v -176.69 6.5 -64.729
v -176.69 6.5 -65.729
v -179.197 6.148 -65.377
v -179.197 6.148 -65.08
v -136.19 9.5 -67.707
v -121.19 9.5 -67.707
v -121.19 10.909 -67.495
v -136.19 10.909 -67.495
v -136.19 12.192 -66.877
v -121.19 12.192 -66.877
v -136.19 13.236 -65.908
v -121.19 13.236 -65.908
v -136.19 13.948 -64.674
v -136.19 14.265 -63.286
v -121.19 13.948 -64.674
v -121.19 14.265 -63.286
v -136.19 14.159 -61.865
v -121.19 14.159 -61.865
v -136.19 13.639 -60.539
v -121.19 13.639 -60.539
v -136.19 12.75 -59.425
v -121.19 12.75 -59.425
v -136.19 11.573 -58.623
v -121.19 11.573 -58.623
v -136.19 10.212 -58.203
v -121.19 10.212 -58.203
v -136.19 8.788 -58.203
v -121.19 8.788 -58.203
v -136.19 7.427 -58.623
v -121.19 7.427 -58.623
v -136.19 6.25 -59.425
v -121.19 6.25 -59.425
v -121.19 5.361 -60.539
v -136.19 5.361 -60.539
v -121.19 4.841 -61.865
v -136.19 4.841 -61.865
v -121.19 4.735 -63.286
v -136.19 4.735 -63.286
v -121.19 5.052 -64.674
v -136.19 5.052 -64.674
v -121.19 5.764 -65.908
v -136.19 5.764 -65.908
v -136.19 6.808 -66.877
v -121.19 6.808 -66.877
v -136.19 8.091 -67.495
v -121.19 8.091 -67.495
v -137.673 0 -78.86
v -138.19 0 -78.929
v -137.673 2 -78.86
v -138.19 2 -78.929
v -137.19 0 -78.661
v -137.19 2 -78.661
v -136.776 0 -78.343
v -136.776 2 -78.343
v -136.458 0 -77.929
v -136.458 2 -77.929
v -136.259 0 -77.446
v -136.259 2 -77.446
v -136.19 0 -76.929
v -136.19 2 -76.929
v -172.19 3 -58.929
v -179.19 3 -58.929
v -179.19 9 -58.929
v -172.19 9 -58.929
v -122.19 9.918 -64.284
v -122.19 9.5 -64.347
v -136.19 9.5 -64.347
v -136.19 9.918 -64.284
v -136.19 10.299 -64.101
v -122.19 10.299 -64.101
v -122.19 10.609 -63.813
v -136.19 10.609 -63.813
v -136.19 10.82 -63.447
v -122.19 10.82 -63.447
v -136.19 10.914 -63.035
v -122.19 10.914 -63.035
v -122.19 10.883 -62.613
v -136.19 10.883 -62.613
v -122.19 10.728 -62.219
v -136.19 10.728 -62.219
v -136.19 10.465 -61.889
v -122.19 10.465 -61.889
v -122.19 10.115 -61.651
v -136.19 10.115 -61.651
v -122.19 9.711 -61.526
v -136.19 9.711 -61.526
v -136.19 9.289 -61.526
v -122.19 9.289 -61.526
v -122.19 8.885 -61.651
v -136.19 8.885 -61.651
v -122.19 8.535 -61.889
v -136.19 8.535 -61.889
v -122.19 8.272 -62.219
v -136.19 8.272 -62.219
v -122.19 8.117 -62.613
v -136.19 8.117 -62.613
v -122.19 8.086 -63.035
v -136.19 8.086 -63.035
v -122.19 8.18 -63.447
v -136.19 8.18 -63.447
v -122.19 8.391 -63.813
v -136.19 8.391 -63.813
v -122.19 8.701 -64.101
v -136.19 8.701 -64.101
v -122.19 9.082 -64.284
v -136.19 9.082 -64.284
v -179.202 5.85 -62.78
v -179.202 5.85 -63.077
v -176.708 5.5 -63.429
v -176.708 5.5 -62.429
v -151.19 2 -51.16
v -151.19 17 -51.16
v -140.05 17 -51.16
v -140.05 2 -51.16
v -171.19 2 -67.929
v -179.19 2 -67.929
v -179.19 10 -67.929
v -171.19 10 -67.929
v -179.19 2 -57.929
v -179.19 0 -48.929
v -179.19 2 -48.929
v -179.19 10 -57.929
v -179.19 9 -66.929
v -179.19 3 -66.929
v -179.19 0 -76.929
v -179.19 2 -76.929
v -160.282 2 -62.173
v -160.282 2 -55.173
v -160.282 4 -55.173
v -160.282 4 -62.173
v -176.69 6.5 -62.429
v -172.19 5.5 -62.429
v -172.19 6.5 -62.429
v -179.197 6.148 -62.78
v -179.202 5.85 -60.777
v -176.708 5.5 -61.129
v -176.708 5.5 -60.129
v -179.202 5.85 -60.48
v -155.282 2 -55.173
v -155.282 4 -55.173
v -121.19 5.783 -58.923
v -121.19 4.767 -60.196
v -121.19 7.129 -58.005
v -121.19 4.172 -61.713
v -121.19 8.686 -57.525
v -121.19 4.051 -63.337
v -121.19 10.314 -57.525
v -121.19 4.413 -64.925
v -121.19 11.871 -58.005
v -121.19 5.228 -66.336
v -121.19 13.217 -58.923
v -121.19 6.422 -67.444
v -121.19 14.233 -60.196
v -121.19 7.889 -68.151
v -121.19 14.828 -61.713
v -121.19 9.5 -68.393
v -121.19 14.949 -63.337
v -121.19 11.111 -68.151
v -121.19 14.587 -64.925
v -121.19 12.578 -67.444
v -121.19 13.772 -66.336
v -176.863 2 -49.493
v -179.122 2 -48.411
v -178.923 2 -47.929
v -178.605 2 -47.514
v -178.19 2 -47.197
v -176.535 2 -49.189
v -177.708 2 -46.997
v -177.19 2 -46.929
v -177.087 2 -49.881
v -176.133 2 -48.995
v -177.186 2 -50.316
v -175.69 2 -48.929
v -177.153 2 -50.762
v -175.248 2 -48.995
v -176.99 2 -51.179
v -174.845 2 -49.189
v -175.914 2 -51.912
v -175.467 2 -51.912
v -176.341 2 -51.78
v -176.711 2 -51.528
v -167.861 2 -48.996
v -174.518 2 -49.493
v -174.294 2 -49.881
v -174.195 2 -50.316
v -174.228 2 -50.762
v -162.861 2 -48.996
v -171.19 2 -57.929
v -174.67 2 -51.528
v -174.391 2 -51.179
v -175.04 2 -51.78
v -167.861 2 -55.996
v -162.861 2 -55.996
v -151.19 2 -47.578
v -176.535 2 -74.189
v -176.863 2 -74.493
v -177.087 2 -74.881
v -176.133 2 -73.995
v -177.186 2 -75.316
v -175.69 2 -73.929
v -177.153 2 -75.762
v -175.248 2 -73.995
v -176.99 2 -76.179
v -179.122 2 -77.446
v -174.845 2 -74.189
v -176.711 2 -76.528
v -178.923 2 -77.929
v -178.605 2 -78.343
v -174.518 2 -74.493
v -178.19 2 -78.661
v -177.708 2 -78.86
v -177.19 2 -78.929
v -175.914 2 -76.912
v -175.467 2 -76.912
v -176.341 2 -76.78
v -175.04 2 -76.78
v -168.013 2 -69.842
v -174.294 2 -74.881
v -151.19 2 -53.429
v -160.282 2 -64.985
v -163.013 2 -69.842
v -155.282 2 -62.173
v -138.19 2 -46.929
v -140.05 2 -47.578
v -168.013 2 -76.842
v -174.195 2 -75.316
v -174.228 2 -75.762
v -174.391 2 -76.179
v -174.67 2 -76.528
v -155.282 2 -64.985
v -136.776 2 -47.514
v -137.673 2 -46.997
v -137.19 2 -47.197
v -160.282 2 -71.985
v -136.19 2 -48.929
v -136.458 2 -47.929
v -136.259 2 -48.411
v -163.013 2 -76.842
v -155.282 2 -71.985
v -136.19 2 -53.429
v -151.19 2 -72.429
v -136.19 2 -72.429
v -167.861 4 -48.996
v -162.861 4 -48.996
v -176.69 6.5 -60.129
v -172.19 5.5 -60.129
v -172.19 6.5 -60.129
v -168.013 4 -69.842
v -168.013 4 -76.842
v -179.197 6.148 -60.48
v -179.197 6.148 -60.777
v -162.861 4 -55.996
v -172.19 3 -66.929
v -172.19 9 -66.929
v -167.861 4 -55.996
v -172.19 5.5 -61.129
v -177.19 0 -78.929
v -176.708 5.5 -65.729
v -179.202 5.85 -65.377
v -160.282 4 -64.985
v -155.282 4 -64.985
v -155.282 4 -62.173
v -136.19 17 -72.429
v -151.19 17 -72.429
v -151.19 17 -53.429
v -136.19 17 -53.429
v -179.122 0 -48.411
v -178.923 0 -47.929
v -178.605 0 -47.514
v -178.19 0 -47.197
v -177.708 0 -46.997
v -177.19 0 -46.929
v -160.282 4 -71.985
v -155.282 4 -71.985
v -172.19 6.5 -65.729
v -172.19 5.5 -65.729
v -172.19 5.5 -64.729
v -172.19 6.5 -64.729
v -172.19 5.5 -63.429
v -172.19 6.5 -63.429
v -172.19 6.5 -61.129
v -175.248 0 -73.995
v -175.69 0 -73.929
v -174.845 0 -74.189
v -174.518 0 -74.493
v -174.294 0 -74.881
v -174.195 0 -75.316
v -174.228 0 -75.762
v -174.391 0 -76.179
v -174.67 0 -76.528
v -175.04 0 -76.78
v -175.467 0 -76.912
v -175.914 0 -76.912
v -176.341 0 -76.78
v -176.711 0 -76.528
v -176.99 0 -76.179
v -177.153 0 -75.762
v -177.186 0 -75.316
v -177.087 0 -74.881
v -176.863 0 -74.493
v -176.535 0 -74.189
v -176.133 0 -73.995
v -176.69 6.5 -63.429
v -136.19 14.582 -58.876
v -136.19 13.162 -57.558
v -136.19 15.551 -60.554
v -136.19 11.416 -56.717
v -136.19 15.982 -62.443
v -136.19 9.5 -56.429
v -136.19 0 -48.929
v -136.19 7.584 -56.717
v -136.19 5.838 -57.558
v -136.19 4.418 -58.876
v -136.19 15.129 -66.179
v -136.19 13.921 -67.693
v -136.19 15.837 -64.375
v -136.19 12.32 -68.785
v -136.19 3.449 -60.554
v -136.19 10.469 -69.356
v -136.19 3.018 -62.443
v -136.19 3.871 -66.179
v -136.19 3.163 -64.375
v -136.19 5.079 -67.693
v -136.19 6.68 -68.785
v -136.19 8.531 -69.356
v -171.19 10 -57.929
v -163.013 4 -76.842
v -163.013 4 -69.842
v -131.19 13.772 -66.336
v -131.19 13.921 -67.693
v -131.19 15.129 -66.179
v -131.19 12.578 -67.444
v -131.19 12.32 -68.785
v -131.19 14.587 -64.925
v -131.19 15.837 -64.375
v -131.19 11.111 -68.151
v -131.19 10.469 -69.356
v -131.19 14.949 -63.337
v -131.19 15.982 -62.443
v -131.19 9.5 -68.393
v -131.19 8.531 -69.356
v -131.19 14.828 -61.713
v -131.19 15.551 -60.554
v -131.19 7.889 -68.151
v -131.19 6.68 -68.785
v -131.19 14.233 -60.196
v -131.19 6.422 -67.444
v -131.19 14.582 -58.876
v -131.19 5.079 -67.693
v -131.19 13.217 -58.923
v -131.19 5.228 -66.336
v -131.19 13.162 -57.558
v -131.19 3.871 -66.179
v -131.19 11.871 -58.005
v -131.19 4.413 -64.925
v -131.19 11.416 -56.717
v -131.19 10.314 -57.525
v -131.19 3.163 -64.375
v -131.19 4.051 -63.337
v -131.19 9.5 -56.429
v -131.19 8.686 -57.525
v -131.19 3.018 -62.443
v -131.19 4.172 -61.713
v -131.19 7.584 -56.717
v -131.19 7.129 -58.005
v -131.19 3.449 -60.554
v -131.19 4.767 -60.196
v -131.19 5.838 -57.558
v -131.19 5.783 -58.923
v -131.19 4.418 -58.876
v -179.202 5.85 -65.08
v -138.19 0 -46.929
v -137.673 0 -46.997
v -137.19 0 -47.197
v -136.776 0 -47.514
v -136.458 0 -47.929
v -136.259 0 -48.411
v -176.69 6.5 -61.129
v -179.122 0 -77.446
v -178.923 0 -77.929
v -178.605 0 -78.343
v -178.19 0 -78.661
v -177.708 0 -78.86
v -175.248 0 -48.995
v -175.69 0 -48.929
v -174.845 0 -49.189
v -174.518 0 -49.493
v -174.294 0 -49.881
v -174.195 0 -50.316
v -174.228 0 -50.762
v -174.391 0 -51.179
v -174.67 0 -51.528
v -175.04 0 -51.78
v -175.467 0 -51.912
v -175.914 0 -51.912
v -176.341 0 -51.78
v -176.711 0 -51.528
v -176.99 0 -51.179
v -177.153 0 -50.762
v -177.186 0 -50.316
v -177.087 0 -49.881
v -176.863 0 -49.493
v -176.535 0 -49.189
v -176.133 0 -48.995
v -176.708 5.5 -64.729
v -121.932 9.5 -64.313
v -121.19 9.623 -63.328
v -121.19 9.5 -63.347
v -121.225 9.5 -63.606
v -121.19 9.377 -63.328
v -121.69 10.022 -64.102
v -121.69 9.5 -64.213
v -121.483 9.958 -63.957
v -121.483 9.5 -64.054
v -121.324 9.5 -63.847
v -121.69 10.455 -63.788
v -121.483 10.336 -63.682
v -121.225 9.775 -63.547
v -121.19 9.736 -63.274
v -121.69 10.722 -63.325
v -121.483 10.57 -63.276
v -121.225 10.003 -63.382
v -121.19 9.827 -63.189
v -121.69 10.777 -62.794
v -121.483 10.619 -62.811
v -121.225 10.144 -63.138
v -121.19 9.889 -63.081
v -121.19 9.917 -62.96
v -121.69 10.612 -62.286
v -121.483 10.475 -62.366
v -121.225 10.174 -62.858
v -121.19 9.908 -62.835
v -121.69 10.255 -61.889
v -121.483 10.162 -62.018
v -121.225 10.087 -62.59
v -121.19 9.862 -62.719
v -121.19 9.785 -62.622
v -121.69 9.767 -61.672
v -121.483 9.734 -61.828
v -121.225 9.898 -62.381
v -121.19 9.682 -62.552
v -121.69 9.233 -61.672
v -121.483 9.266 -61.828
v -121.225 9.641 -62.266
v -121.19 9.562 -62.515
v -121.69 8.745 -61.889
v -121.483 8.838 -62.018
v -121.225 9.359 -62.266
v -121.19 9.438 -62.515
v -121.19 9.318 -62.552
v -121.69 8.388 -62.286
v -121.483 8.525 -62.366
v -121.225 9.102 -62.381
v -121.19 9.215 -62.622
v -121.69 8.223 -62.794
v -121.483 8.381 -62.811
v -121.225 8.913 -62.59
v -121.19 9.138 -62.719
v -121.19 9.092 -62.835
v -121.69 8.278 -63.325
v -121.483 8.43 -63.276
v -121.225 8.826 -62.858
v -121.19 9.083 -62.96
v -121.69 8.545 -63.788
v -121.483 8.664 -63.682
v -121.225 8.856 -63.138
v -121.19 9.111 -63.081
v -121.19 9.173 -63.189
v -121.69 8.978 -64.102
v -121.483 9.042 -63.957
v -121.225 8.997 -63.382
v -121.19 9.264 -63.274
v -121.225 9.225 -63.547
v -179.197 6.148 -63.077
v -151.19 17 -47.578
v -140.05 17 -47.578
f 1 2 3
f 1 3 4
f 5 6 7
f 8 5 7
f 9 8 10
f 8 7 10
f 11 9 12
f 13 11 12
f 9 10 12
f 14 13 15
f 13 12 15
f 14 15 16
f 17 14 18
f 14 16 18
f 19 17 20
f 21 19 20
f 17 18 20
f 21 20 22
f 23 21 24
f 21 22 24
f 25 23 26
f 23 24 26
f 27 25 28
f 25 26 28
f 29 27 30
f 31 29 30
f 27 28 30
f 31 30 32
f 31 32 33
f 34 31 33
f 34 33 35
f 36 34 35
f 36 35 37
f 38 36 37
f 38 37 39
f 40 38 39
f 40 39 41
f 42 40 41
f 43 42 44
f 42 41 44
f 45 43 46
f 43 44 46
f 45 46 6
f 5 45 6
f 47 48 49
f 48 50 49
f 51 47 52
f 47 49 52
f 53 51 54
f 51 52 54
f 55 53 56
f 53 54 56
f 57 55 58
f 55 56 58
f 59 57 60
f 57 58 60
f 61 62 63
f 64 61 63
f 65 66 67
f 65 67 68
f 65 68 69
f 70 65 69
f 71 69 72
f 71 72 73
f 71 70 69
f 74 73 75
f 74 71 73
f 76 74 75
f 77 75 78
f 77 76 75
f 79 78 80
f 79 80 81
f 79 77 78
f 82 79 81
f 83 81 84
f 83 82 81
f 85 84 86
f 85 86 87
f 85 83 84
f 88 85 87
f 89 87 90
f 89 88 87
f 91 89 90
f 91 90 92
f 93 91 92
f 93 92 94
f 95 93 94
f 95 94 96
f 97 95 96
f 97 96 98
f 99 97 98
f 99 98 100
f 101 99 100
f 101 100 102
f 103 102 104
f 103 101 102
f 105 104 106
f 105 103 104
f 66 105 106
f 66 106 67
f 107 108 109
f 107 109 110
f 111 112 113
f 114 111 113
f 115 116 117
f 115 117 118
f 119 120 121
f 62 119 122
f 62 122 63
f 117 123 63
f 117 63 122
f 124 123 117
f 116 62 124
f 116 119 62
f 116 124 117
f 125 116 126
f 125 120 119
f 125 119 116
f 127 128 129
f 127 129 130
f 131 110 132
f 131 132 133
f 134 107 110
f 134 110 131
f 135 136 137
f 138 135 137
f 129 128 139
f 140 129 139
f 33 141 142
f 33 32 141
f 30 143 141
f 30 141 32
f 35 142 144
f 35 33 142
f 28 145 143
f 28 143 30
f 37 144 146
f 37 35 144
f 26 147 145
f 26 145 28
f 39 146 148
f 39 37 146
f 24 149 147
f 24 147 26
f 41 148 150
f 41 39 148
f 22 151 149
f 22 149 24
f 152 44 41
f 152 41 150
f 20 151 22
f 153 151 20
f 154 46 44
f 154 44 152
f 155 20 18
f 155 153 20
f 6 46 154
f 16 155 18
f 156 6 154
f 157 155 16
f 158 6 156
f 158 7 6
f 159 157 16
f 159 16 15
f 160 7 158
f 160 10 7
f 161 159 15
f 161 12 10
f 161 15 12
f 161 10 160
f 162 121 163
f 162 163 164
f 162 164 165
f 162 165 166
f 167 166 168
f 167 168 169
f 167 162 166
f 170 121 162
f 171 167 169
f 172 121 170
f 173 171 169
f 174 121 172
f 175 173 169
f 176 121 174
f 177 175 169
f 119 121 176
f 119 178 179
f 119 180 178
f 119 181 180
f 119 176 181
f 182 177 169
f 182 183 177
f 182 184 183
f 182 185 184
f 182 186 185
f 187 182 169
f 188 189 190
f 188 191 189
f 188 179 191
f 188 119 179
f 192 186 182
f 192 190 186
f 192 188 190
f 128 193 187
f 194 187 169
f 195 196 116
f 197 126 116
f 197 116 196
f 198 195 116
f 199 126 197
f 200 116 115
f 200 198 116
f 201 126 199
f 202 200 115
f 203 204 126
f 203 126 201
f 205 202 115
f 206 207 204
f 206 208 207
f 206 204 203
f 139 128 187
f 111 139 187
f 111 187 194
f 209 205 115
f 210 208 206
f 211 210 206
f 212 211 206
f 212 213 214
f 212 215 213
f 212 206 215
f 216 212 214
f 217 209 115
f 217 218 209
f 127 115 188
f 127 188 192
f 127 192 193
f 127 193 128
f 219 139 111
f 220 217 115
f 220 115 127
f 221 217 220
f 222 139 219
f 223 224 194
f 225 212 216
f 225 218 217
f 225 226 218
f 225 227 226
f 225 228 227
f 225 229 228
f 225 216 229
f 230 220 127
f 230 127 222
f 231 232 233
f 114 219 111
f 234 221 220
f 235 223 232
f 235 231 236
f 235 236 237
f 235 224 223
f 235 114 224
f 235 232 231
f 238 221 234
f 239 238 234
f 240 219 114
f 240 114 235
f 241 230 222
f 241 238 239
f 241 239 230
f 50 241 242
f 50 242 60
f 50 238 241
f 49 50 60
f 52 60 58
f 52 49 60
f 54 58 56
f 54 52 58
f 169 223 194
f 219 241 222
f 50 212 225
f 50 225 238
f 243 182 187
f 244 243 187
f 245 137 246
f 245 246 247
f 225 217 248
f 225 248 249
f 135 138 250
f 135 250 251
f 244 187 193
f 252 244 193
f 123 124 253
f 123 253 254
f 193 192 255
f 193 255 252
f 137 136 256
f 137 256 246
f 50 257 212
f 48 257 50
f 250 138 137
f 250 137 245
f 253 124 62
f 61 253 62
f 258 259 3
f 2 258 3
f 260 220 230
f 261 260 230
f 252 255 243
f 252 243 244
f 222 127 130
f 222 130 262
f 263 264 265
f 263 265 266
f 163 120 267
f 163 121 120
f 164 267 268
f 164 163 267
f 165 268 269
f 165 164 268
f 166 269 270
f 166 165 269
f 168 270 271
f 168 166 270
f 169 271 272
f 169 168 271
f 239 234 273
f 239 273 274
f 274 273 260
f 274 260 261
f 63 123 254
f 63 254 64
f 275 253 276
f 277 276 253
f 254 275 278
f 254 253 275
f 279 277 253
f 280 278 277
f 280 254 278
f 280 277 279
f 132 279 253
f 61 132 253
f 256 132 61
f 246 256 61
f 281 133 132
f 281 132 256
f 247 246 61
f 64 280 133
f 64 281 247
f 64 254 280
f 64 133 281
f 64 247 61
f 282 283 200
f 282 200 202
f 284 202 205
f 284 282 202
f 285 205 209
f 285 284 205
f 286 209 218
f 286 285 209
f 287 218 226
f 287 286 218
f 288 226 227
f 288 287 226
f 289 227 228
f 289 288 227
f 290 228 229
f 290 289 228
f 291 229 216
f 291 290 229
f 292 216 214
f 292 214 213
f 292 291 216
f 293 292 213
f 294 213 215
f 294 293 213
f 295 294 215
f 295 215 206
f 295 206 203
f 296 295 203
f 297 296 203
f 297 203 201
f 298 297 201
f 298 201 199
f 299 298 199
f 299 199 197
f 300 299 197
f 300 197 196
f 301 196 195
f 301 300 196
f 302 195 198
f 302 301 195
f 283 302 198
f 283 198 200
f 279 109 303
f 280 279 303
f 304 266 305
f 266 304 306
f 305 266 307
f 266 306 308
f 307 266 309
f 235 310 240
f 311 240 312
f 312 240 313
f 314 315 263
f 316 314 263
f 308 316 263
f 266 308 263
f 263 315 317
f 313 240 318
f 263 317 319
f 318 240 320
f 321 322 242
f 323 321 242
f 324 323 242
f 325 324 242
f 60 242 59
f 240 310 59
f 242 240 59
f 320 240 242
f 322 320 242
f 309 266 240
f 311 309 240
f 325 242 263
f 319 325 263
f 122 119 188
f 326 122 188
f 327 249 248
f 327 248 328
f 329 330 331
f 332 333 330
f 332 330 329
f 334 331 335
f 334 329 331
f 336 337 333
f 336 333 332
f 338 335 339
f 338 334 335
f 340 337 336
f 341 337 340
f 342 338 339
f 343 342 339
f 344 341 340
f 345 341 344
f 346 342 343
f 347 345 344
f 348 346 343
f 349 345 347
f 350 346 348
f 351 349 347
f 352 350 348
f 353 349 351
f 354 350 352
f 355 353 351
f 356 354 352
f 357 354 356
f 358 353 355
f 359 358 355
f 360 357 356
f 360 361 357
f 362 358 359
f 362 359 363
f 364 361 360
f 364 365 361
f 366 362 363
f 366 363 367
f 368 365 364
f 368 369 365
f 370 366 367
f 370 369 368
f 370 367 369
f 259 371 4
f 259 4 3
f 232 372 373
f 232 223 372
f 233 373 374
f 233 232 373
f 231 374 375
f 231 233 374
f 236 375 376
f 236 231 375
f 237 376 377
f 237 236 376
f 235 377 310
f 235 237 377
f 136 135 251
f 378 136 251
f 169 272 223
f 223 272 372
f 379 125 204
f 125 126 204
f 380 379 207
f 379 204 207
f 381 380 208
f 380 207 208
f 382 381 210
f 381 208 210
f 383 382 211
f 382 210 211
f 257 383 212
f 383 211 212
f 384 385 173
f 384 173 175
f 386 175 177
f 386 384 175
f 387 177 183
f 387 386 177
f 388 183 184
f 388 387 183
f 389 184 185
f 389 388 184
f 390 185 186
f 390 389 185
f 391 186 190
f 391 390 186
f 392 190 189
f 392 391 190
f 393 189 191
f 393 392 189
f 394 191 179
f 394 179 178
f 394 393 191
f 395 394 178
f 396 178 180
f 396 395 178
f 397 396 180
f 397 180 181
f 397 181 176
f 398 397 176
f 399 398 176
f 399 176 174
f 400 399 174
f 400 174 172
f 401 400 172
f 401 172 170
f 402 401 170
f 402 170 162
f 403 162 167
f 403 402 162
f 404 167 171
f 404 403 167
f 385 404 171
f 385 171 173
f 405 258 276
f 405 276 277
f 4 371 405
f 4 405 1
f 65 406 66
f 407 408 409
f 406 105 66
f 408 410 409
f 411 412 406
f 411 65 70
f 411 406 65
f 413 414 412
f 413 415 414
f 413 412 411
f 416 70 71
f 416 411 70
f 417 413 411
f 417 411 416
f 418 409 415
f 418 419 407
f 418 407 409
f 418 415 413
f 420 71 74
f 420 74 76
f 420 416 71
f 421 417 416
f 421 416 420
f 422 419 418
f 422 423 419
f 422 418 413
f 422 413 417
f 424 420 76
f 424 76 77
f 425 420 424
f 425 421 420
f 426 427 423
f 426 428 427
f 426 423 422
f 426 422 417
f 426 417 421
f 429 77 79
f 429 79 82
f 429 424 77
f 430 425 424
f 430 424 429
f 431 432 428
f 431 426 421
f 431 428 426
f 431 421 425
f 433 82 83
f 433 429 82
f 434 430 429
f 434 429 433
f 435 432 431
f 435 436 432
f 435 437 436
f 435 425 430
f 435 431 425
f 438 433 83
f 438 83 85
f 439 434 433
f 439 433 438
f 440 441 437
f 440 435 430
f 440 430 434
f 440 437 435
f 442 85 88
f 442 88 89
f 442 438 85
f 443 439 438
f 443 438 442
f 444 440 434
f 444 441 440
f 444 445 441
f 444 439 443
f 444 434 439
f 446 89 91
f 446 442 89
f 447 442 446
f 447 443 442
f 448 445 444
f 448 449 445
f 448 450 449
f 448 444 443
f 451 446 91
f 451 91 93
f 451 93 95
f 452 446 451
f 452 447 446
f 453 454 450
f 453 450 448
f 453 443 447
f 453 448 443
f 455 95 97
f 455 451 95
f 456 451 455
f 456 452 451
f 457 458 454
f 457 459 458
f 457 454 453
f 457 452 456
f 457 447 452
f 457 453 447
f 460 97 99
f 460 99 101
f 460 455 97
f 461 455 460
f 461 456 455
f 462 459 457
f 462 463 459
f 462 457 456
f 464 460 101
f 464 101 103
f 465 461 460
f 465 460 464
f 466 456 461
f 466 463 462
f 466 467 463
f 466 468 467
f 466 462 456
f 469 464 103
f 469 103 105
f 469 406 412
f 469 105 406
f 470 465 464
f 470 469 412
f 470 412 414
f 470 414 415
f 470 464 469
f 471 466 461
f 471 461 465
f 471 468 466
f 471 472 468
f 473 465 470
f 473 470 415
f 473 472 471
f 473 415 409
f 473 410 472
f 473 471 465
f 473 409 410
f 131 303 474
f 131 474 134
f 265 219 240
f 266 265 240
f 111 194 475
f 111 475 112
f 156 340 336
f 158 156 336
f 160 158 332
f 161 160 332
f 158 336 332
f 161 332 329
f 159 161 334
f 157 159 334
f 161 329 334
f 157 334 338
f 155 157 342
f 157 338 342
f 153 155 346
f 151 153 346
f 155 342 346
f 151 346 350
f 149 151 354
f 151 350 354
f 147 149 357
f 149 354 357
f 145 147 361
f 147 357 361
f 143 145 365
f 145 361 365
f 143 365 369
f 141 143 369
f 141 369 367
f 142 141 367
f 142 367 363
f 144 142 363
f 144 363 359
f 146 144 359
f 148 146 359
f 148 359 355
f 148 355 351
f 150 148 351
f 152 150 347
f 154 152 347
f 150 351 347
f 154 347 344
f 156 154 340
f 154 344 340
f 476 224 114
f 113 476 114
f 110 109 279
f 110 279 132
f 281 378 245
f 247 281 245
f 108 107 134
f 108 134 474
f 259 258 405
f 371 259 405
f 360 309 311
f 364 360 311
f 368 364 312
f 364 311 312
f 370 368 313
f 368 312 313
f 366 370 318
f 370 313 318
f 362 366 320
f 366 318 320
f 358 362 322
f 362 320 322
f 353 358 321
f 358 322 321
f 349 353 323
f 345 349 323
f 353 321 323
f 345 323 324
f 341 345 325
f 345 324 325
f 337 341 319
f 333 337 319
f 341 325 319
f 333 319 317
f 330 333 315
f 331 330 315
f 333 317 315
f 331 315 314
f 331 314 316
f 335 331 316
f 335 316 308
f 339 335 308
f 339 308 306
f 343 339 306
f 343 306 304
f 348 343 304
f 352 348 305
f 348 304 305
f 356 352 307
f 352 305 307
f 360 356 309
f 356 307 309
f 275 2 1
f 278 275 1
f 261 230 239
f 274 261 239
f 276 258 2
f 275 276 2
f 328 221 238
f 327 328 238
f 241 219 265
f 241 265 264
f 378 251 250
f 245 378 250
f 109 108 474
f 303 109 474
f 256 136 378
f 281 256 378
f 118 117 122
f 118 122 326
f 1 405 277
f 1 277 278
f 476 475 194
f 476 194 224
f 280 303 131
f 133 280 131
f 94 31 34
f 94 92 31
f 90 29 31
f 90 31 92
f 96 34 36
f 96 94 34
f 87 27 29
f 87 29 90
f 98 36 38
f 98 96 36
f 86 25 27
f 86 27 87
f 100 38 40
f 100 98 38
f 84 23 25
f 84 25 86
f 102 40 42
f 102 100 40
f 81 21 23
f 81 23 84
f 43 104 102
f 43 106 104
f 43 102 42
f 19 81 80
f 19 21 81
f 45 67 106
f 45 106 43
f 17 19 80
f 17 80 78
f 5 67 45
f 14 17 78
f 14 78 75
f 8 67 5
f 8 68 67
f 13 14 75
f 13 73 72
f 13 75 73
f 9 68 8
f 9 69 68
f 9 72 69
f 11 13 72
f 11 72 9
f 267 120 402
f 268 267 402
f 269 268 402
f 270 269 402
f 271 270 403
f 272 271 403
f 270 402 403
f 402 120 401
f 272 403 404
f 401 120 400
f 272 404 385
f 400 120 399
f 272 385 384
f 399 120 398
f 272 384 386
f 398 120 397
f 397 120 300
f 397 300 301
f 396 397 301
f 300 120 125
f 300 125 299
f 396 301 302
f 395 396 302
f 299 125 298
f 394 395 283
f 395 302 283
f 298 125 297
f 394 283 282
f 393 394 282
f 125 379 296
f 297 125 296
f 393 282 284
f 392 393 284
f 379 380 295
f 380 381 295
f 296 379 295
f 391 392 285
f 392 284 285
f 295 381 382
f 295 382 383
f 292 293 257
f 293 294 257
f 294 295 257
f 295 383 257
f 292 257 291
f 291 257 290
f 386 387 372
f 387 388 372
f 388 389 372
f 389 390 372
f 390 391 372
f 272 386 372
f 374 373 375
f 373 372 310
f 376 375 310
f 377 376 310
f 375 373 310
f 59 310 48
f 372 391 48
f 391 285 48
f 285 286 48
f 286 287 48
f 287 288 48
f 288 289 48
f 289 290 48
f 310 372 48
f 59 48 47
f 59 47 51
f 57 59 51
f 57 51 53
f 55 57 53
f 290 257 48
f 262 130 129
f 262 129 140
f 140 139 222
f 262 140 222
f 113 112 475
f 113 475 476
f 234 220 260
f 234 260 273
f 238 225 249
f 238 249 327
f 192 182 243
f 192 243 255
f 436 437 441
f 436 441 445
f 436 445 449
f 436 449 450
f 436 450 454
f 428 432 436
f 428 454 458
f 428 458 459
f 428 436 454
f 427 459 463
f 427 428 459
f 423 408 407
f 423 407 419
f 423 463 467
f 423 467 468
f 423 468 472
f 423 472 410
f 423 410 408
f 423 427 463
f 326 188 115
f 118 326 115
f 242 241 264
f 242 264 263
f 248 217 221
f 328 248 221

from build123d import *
from OCP.BRepFilletAPI import BRepFilletAPI_MakeChamfer

# Parameters (mm, degrees)
SKETCH1_W           = 43
SKETCH1_H           = 32
SKETCH1_R           = 1.5
BOSS_EXTRUDE1_DEPTH = 2
FILLET1_R           = 2
SKETCH2_W           = 15
SKETCH2_H           = 19
SKETCH2_W_2         = 11.140552481
SKETCH2_H_2         = 3.582781673
BOSS_EXTRUDE2_DEPTH = 15
SKETCH3_W           = 8
SKETCH3_H           = 10
BOSS_EXTRUDE3_DEPTH = 8
SKETCH4_W           = 5
SKETCH4_H           = 7
BOSS_EXTRUDE4_DEPTH = 2
SKETCH5_W           = 8
SKETCH5_H           = 6
SKETCH5_W_2         = 1
SKETCH5_H_2         = 1
CUT_EXTRUDE1_DEPTH  = 7
DRAFT1_ANGLE        = 1
CHAMFER1_SIZE       = 2.5
CHAMFER1_SIZE2      = 0.351352087
CHAMFER1_SIZE2_2    = 0.352269778
CHAMFER1_SIZE2_3    = 0.350545667
SKETCH6_R           = 6.5
BOSS_EXTRUDE5_DEPTH = 5
SKETCH7_R           = 5.464716876
BOSS_EXTRUDE6_DEPTH = 10
SKETCH8_R           = 4.778839206
SKETCH8_R_2         = 1.418417939
CUT_EXTRUDE2_DEPTH  = 15
FILLET3_R           = 1


with BuildPart() as part:
    # Sketch1 → Boss-Extrude1 (new body)
    with BuildSketch(Plane(origin=(0, 0, 0), x_dir=(1, 0, 0), z_dir=(0, 1, 0))):
        with Locations((-157.69047619, 62.928571429)):
            Rectangle(SKETCH1_W, SKETCH1_H)
        with Locations(Location((-175.69047619, 75.428571429, 0), (0, 0, 270))):
            Circle(SKETCH1_R, mode=Mode.SUBTRACT)
        with Locations(Location((-175.69047619, 50.428571429, 0), (0, 0, 270))):
            Circle(SKETCH1_R, mode=Mode.SUBTRACT)
    extrude(amount=BOSS_EXTRUDE1_DEPTH)

    # Fillet1
    fillet1_edges = [part.edges().sort_by_distance(p)[0] for p in [
        (-179.19047619, 1, -78.928571429),
        (-136.19047619, 1, -78.928571429),
        (-136.19047619, 1, -46.928571429),
        (-179.19047619, 1, -46.928571429),
    ]]
    fillet(fillet1_edges, radius=FILLET1_R)

    # Sketch2 → Boss-Extrude2 (add)
    with BuildSketch(Plane(origin=(0, 2, 0), x_dir=(1, 0, 0), z_dir=(0, 1, 0))):
        with Locations((-143.69047619, 62.928571429)):
            Rectangle(SKETCH2_W, SKETCH2_H)
        with Locations((-145.62019995, 49.369059298)):
            Rectangle(SKETCH2_W_2, SKETCH2_H_2)
    extrude(amount=BOSS_EXTRUDE2_DEPTH)

    # Sketch3 → Boss-Extrude3 (add)
    with BuildSketch(Plane(origin=(0, 2, 0), x_dir=(1, 0, 0), z_dir=(0, 1, 0))):
        with Locations((-175.19047619, 62.928571429)):
            Rectangle(SKETCH3_W, SKETCH3_H)
    extrude(amount=BOSS_EXTRUDE3_DEPTH)

    # Sketch4 → Boss-Extrude4 (add)
    with BuildSketch(Plane(origin=(0, 2, 0), x_dir=(1, 0, 0), z_dir=(0, 1, 0))):
        with Locations((-157.781788093, 68.484522729)):
            Rectangle(SKETCH4_W, SKETCH4_H)
        with Locations((-157.781788093, 58.672517023)):
            Rectangle(SKETCH4_W, SKETCH4_H)
        with Locations((-165.512552384, 73.341751138)):
            Rectangle(SKETCH4_W, SKETCH4_H)
        with Locations((-165.361321637, 52.495882076)):
            Rectangle(SKETCH4_W, SKETCH4_H)
    extrude(amount=BOSS_EXTRUDE4_DEPTH)

    # Sketch5 → Cut-Extrude1 (cut)
    with BuildSketch(Plane.ZY.offset(179.19047619)):
        with Locations((-62.928571429, 6)):
            Rectangle(SKETCH5_W, SKETCH5_H)
        with Locations((-65.228571429, 6)):
            Rectangle(SKETCH5_W_2, SKETCH5_H_2, mode=Mode.SUBTRACT)
        with Locations((-62.928571429, 6)):
            Rectangle(SKETCH5_W_2, SKETCH5_H_2, mode=Mode.SUBTRACT)
        with Locations((-60.628571429, 6)):
            Rectangle(SKETCH5_W_2, SKETCH5_H_2, mode=Mode.SUBTRACT)
    extrude(amount=-CUT_EXTRUDE1_DEPTH, mode=Mode.SUBTRACT)

    # Draft1
    draft1_faces = [part.faces().sort_by_distance(p)[0] for p in [
        (-179.19047619, 6, -65.228571429),
        (-179.19047619, 6, -60.628571429),
        (-179.19047619, 6, -62.928571429),
    ]]
    draft(draft1_faces, Plane(origin=(-172.19047619, 6.5, -63.428571429), x_dir=(0, 0, 1), z_dir=(0, 1, 0)), DRAFT1_ANGLE)

    # Chamfer1: one chamfer whose edges measure the first distance from different faces: ONE call of the kernel's chamfer builder (chamfer() names one face for all edges)
    chamfer1_edges_1 = [part.edges().sort_by_distance(p)[0] for p in [
        (-179.199203723, 6, -65.728571429),
    ]]
    chamfer1_side_1 = [part.faces().sort_by_distance(p)[0] for p in [
        (-175.694841768, 5.99979246, -65.728571429),
    ]]
    chamfer1_edges_2 = [part.edges().sort_by_distance(p)[0] for p in [
        (-179.19047619, 6.5, -65.228571429),
    ]]
    chamfer1_side_2 = [part.faces().sort_by_distance(p)[0] for p in [
        (-175.69047619, 6.5, -65.228571429),
    ]]
    chamfer1_edges_3 = [part.edges().sort_by_distance(p)[0] for p in [
        (-179.199203723, 6, -64.728571429),
    ]]
    chamfer1_side_3 = [part.faces().sort_by_distance(p)[0] for p in [
        (-175.694841768, 5.99979246, -64.728571429),
    ]]
    chamfer1_edges_4 = [part.edges().sort_by_distance(p)[0] for p in [
        (-179.207931255, 5.5, -65.228571429),
    ]]
    chamfer1_side_4 = [part.faces().sort_by_distance(p)[0] for p in [
        (-175.699203723, 5.5, -65.228571429),
    ]]
    chamfer1_edges_5 = [part.edges().sort_by_distance(p)[0] for p in [
        (-179.199203723, 6, -63.428571429),
    ]]
    chamfer1_side_5 = [part.faces().sort_by_distance(p)[0] for p in [
        (-175.694841768, 5.99979246, -63.428571429),
    ]]
    chamfer1_edges_6 = [part.edges().sort_by_distance(p)[0] for p in [
        (-179.19047619, 6.5, -62.928571429),
    ]]
    chamfer1_side_6 = [part.faces().sort_by_distance(p)[0] for p in [
        (-175.69047619, 6.5, -62.928571429),
    ]]
    chamfer1_edges_7 = [part.edges().sort_by_distance(p)[0] for p in [
        (-179.199203723, 6, -62.428571429),
    ]]
    chamfer1_side_7 = [part.faces().sort_by_distance(p)[0] for p in [
        (-175.694841768, 5.99979246, -62.428571429),
    ]]
    chamfer1_edges_8 = [part.edges().sort_by_distance(p)[0] for p in [
        (-179.207931255, 5.5, -62.928571429),
    ]]
    chamfer1_side_8 = [part.faces().sort_by_distance(p)[0] for p in [
        (-175.699203723, 5.5, -62.928571429),
    ]]
    chamfer1_edges_9 = [part.edges().sort_by_distance(p)[0] for p in [
        (-179.199203723, 6, -61.128571429),
    ]]
    chamfer1_side_9 = [part.faces().sort_by_distance(p)[0] for p in [
        (-175.694841768, 5.99979246, -61.128571429),
    ]]
    chamfer1_edges_10 = [part.edges().sort_by_distance(p)[0] for p in [
        (-179.19047619, 6.5, -60.628571429),
    ]]
    chamfer1_side_10 = [part.faces().sort_by_distance(p)[0] for p in [
        (-175.69047619, 6.5, -60.628571429),
    ]]
    chamfer1_edges_11 = [part.edges().sort_by_distance(p)[0] for p in [
        (-179.199203723, 6, -60.128571429),
    ]]
    chamfer1_side_11 = [part.faces().sort_by_distance(p)[0] for p in [
        (-175.694841768, 5.99979246, -60.128571429),
    ]]
    chamfer1_edges_12 = [part.edges().sort_by_distance(p)[0] for p in [
        (-179.207931255, 5.5, -60.628571429),
    ]]
    chamfer1_side_12 = [part.faces().sort_by_distance(p)[0] for p in [
        (-175.699203723, 5.5, -60.628571429),
    ]]
    chamfer1 = BRepFilletAPI_MakeChamfer(part.part.solid().wrapped)
    for e in chamfer1_edges_1:
        chamfer1.Add(CHAMFER1_SIZE, CHAMFER1_SIZE2, e.wrapped, chamfer1_side_1[0].wrapped)  # the first distance lies on this face
    for e in chamfer1_edges_2:
        chamfer1.Add(CHAMFER1_SIZE, CHAMFER1_SIZE2_2, e.wrapped, chamfer1_side_2[0].wrapped)  # the first distance lies on this face
    for e in chamfer1_edges_3:
        chamfer1.Add(CHAMFER1_SIZE, CHAMFER1_SIZE2, e.wrapped, chamfer1_side_3[0].wrapped)  # the first distance lies on this face
    for e in chamfer1_edges_4:
        chamfer1.Add(CHAMFER1_SIZE, CHAMFER1_SIZE2_3, e.wrapped, chamfer1_side_4[0].wrapped)  # the first distance lies on this face
    for e in chamfer1_edges_5:
        chamfer1.Add(CHAMFER1_SIZE, CHAMFER1_SIZE2, e.wrapped, chamfer1_side_5[0].wrapped)  # the first distance lies on this face
    for e in chamfer1_edges_6:
        chamfer1.Add(CHAMFER1_SIZE, CHAMFER1_SIZE2_2, e.wrapped, chamfer1_side_6[0].wrapped)  # the first distance lies on this face
    for e in chamfer1_edges_7:
        chamfer1.Add(CHAMFER1_SIZE, CHAMFER1_SIZE2, e.wrapped, chamfer1_side_7[0].wrapped)  # the first distance lies on this face
    for e in chamfer1_edges_8:
        chamfer1.Add(CHAMFER1_SIZE, CHAMFER1_SIZE2_3, e.wrapped, chamfer1_side_8[0].wrapped)  # the first distance lies on this face
    for e in chamfer1_edges_9:
        chamfer1.Add(CHAMFER1_SIZE, CHAMFER1_SIZE2, e.wrapped, chamfer1_side_9[0].wrapped)  # the first distance lies on this face
    for e in chamfer1_edges_10:
        chamfer1.Add(CHAMFER1_SIZE, CHAMFER1_SIZE2_2, e.wrapped, chamfer1_side_10[0].wrapped)  # the first distance lies on this face
    for e in chamfer1_edges_11:
        chamfer1.Add(CHAMFER1_SIZE, CHAMFER1_SIZE2, e.wrapped, chamfer1_side_11[0].wrapped)  # the first distance lies on this face
    for e in chamfer1_edges_12:
        chamfer1.Add(CHAMFER1_SIZE, CHAMFER1_SIZE2_3, e.wrapped, chamfer1_side_12[0].wrapped)  # the first distance lies on this face
    add(Compound.cast(chamfer1.Shape()), mode=Mode.REPLACE)

    # Sketch6 → Boss-Extrude5 (add)
    with BuildSketch(Plane(origin=(-136.19047619, 0, 0), x_dir=(0, 0, -1), z_dir=(1, 0, 0))):
        with Locations(Location((62.928571429, 9.5, 0), (0, 0, 180))):
            Circle(SKETCH6_R)
    extrude(amount=BOSS_EXTRUDE5_DEPTH)

    # Sketch7 → Boss-Extrude6 (add)
    with BuildSketch(Plane(origin=(-131.19047619, 0, 0), x_dir=(0, 0, -1), z_dir=(1, 0, 0))):
        with Locations((62.928571429, 9.5)):
            Circle(SKETCH7_R)
    extrude(amount=BOSS_EXTRUDE6_DEPTH)

    # Sketch8 → Cut-Extrude2 (cut)
    with BuildSketch(Plane(origin=(-121.19047619, 0, 0), x_dir=(0, 0, -1), z_dir=(1, 0, 0))):
        with Locations((62.928571429, 9.5)):
            Circle(SKETCH8_R)
        with Locations((62.928571429, 9.5)):
            Circle(SKETCH8_R_2, mode=Mode.SUBTRACT)
    extrude(amount=-CUT_EXTRUDE2_DEPTH, mode=Mode.SUBTRACT)

    # Fillet3
    fillet3_edges = [part.edges().sort_by_distance(p)[0] for p in [
        (-121.19047619, 9.5, -61.51015349),
    ]]
    fillet(fillet3_edges, radius=FILLET3_R)


solid = part.part
